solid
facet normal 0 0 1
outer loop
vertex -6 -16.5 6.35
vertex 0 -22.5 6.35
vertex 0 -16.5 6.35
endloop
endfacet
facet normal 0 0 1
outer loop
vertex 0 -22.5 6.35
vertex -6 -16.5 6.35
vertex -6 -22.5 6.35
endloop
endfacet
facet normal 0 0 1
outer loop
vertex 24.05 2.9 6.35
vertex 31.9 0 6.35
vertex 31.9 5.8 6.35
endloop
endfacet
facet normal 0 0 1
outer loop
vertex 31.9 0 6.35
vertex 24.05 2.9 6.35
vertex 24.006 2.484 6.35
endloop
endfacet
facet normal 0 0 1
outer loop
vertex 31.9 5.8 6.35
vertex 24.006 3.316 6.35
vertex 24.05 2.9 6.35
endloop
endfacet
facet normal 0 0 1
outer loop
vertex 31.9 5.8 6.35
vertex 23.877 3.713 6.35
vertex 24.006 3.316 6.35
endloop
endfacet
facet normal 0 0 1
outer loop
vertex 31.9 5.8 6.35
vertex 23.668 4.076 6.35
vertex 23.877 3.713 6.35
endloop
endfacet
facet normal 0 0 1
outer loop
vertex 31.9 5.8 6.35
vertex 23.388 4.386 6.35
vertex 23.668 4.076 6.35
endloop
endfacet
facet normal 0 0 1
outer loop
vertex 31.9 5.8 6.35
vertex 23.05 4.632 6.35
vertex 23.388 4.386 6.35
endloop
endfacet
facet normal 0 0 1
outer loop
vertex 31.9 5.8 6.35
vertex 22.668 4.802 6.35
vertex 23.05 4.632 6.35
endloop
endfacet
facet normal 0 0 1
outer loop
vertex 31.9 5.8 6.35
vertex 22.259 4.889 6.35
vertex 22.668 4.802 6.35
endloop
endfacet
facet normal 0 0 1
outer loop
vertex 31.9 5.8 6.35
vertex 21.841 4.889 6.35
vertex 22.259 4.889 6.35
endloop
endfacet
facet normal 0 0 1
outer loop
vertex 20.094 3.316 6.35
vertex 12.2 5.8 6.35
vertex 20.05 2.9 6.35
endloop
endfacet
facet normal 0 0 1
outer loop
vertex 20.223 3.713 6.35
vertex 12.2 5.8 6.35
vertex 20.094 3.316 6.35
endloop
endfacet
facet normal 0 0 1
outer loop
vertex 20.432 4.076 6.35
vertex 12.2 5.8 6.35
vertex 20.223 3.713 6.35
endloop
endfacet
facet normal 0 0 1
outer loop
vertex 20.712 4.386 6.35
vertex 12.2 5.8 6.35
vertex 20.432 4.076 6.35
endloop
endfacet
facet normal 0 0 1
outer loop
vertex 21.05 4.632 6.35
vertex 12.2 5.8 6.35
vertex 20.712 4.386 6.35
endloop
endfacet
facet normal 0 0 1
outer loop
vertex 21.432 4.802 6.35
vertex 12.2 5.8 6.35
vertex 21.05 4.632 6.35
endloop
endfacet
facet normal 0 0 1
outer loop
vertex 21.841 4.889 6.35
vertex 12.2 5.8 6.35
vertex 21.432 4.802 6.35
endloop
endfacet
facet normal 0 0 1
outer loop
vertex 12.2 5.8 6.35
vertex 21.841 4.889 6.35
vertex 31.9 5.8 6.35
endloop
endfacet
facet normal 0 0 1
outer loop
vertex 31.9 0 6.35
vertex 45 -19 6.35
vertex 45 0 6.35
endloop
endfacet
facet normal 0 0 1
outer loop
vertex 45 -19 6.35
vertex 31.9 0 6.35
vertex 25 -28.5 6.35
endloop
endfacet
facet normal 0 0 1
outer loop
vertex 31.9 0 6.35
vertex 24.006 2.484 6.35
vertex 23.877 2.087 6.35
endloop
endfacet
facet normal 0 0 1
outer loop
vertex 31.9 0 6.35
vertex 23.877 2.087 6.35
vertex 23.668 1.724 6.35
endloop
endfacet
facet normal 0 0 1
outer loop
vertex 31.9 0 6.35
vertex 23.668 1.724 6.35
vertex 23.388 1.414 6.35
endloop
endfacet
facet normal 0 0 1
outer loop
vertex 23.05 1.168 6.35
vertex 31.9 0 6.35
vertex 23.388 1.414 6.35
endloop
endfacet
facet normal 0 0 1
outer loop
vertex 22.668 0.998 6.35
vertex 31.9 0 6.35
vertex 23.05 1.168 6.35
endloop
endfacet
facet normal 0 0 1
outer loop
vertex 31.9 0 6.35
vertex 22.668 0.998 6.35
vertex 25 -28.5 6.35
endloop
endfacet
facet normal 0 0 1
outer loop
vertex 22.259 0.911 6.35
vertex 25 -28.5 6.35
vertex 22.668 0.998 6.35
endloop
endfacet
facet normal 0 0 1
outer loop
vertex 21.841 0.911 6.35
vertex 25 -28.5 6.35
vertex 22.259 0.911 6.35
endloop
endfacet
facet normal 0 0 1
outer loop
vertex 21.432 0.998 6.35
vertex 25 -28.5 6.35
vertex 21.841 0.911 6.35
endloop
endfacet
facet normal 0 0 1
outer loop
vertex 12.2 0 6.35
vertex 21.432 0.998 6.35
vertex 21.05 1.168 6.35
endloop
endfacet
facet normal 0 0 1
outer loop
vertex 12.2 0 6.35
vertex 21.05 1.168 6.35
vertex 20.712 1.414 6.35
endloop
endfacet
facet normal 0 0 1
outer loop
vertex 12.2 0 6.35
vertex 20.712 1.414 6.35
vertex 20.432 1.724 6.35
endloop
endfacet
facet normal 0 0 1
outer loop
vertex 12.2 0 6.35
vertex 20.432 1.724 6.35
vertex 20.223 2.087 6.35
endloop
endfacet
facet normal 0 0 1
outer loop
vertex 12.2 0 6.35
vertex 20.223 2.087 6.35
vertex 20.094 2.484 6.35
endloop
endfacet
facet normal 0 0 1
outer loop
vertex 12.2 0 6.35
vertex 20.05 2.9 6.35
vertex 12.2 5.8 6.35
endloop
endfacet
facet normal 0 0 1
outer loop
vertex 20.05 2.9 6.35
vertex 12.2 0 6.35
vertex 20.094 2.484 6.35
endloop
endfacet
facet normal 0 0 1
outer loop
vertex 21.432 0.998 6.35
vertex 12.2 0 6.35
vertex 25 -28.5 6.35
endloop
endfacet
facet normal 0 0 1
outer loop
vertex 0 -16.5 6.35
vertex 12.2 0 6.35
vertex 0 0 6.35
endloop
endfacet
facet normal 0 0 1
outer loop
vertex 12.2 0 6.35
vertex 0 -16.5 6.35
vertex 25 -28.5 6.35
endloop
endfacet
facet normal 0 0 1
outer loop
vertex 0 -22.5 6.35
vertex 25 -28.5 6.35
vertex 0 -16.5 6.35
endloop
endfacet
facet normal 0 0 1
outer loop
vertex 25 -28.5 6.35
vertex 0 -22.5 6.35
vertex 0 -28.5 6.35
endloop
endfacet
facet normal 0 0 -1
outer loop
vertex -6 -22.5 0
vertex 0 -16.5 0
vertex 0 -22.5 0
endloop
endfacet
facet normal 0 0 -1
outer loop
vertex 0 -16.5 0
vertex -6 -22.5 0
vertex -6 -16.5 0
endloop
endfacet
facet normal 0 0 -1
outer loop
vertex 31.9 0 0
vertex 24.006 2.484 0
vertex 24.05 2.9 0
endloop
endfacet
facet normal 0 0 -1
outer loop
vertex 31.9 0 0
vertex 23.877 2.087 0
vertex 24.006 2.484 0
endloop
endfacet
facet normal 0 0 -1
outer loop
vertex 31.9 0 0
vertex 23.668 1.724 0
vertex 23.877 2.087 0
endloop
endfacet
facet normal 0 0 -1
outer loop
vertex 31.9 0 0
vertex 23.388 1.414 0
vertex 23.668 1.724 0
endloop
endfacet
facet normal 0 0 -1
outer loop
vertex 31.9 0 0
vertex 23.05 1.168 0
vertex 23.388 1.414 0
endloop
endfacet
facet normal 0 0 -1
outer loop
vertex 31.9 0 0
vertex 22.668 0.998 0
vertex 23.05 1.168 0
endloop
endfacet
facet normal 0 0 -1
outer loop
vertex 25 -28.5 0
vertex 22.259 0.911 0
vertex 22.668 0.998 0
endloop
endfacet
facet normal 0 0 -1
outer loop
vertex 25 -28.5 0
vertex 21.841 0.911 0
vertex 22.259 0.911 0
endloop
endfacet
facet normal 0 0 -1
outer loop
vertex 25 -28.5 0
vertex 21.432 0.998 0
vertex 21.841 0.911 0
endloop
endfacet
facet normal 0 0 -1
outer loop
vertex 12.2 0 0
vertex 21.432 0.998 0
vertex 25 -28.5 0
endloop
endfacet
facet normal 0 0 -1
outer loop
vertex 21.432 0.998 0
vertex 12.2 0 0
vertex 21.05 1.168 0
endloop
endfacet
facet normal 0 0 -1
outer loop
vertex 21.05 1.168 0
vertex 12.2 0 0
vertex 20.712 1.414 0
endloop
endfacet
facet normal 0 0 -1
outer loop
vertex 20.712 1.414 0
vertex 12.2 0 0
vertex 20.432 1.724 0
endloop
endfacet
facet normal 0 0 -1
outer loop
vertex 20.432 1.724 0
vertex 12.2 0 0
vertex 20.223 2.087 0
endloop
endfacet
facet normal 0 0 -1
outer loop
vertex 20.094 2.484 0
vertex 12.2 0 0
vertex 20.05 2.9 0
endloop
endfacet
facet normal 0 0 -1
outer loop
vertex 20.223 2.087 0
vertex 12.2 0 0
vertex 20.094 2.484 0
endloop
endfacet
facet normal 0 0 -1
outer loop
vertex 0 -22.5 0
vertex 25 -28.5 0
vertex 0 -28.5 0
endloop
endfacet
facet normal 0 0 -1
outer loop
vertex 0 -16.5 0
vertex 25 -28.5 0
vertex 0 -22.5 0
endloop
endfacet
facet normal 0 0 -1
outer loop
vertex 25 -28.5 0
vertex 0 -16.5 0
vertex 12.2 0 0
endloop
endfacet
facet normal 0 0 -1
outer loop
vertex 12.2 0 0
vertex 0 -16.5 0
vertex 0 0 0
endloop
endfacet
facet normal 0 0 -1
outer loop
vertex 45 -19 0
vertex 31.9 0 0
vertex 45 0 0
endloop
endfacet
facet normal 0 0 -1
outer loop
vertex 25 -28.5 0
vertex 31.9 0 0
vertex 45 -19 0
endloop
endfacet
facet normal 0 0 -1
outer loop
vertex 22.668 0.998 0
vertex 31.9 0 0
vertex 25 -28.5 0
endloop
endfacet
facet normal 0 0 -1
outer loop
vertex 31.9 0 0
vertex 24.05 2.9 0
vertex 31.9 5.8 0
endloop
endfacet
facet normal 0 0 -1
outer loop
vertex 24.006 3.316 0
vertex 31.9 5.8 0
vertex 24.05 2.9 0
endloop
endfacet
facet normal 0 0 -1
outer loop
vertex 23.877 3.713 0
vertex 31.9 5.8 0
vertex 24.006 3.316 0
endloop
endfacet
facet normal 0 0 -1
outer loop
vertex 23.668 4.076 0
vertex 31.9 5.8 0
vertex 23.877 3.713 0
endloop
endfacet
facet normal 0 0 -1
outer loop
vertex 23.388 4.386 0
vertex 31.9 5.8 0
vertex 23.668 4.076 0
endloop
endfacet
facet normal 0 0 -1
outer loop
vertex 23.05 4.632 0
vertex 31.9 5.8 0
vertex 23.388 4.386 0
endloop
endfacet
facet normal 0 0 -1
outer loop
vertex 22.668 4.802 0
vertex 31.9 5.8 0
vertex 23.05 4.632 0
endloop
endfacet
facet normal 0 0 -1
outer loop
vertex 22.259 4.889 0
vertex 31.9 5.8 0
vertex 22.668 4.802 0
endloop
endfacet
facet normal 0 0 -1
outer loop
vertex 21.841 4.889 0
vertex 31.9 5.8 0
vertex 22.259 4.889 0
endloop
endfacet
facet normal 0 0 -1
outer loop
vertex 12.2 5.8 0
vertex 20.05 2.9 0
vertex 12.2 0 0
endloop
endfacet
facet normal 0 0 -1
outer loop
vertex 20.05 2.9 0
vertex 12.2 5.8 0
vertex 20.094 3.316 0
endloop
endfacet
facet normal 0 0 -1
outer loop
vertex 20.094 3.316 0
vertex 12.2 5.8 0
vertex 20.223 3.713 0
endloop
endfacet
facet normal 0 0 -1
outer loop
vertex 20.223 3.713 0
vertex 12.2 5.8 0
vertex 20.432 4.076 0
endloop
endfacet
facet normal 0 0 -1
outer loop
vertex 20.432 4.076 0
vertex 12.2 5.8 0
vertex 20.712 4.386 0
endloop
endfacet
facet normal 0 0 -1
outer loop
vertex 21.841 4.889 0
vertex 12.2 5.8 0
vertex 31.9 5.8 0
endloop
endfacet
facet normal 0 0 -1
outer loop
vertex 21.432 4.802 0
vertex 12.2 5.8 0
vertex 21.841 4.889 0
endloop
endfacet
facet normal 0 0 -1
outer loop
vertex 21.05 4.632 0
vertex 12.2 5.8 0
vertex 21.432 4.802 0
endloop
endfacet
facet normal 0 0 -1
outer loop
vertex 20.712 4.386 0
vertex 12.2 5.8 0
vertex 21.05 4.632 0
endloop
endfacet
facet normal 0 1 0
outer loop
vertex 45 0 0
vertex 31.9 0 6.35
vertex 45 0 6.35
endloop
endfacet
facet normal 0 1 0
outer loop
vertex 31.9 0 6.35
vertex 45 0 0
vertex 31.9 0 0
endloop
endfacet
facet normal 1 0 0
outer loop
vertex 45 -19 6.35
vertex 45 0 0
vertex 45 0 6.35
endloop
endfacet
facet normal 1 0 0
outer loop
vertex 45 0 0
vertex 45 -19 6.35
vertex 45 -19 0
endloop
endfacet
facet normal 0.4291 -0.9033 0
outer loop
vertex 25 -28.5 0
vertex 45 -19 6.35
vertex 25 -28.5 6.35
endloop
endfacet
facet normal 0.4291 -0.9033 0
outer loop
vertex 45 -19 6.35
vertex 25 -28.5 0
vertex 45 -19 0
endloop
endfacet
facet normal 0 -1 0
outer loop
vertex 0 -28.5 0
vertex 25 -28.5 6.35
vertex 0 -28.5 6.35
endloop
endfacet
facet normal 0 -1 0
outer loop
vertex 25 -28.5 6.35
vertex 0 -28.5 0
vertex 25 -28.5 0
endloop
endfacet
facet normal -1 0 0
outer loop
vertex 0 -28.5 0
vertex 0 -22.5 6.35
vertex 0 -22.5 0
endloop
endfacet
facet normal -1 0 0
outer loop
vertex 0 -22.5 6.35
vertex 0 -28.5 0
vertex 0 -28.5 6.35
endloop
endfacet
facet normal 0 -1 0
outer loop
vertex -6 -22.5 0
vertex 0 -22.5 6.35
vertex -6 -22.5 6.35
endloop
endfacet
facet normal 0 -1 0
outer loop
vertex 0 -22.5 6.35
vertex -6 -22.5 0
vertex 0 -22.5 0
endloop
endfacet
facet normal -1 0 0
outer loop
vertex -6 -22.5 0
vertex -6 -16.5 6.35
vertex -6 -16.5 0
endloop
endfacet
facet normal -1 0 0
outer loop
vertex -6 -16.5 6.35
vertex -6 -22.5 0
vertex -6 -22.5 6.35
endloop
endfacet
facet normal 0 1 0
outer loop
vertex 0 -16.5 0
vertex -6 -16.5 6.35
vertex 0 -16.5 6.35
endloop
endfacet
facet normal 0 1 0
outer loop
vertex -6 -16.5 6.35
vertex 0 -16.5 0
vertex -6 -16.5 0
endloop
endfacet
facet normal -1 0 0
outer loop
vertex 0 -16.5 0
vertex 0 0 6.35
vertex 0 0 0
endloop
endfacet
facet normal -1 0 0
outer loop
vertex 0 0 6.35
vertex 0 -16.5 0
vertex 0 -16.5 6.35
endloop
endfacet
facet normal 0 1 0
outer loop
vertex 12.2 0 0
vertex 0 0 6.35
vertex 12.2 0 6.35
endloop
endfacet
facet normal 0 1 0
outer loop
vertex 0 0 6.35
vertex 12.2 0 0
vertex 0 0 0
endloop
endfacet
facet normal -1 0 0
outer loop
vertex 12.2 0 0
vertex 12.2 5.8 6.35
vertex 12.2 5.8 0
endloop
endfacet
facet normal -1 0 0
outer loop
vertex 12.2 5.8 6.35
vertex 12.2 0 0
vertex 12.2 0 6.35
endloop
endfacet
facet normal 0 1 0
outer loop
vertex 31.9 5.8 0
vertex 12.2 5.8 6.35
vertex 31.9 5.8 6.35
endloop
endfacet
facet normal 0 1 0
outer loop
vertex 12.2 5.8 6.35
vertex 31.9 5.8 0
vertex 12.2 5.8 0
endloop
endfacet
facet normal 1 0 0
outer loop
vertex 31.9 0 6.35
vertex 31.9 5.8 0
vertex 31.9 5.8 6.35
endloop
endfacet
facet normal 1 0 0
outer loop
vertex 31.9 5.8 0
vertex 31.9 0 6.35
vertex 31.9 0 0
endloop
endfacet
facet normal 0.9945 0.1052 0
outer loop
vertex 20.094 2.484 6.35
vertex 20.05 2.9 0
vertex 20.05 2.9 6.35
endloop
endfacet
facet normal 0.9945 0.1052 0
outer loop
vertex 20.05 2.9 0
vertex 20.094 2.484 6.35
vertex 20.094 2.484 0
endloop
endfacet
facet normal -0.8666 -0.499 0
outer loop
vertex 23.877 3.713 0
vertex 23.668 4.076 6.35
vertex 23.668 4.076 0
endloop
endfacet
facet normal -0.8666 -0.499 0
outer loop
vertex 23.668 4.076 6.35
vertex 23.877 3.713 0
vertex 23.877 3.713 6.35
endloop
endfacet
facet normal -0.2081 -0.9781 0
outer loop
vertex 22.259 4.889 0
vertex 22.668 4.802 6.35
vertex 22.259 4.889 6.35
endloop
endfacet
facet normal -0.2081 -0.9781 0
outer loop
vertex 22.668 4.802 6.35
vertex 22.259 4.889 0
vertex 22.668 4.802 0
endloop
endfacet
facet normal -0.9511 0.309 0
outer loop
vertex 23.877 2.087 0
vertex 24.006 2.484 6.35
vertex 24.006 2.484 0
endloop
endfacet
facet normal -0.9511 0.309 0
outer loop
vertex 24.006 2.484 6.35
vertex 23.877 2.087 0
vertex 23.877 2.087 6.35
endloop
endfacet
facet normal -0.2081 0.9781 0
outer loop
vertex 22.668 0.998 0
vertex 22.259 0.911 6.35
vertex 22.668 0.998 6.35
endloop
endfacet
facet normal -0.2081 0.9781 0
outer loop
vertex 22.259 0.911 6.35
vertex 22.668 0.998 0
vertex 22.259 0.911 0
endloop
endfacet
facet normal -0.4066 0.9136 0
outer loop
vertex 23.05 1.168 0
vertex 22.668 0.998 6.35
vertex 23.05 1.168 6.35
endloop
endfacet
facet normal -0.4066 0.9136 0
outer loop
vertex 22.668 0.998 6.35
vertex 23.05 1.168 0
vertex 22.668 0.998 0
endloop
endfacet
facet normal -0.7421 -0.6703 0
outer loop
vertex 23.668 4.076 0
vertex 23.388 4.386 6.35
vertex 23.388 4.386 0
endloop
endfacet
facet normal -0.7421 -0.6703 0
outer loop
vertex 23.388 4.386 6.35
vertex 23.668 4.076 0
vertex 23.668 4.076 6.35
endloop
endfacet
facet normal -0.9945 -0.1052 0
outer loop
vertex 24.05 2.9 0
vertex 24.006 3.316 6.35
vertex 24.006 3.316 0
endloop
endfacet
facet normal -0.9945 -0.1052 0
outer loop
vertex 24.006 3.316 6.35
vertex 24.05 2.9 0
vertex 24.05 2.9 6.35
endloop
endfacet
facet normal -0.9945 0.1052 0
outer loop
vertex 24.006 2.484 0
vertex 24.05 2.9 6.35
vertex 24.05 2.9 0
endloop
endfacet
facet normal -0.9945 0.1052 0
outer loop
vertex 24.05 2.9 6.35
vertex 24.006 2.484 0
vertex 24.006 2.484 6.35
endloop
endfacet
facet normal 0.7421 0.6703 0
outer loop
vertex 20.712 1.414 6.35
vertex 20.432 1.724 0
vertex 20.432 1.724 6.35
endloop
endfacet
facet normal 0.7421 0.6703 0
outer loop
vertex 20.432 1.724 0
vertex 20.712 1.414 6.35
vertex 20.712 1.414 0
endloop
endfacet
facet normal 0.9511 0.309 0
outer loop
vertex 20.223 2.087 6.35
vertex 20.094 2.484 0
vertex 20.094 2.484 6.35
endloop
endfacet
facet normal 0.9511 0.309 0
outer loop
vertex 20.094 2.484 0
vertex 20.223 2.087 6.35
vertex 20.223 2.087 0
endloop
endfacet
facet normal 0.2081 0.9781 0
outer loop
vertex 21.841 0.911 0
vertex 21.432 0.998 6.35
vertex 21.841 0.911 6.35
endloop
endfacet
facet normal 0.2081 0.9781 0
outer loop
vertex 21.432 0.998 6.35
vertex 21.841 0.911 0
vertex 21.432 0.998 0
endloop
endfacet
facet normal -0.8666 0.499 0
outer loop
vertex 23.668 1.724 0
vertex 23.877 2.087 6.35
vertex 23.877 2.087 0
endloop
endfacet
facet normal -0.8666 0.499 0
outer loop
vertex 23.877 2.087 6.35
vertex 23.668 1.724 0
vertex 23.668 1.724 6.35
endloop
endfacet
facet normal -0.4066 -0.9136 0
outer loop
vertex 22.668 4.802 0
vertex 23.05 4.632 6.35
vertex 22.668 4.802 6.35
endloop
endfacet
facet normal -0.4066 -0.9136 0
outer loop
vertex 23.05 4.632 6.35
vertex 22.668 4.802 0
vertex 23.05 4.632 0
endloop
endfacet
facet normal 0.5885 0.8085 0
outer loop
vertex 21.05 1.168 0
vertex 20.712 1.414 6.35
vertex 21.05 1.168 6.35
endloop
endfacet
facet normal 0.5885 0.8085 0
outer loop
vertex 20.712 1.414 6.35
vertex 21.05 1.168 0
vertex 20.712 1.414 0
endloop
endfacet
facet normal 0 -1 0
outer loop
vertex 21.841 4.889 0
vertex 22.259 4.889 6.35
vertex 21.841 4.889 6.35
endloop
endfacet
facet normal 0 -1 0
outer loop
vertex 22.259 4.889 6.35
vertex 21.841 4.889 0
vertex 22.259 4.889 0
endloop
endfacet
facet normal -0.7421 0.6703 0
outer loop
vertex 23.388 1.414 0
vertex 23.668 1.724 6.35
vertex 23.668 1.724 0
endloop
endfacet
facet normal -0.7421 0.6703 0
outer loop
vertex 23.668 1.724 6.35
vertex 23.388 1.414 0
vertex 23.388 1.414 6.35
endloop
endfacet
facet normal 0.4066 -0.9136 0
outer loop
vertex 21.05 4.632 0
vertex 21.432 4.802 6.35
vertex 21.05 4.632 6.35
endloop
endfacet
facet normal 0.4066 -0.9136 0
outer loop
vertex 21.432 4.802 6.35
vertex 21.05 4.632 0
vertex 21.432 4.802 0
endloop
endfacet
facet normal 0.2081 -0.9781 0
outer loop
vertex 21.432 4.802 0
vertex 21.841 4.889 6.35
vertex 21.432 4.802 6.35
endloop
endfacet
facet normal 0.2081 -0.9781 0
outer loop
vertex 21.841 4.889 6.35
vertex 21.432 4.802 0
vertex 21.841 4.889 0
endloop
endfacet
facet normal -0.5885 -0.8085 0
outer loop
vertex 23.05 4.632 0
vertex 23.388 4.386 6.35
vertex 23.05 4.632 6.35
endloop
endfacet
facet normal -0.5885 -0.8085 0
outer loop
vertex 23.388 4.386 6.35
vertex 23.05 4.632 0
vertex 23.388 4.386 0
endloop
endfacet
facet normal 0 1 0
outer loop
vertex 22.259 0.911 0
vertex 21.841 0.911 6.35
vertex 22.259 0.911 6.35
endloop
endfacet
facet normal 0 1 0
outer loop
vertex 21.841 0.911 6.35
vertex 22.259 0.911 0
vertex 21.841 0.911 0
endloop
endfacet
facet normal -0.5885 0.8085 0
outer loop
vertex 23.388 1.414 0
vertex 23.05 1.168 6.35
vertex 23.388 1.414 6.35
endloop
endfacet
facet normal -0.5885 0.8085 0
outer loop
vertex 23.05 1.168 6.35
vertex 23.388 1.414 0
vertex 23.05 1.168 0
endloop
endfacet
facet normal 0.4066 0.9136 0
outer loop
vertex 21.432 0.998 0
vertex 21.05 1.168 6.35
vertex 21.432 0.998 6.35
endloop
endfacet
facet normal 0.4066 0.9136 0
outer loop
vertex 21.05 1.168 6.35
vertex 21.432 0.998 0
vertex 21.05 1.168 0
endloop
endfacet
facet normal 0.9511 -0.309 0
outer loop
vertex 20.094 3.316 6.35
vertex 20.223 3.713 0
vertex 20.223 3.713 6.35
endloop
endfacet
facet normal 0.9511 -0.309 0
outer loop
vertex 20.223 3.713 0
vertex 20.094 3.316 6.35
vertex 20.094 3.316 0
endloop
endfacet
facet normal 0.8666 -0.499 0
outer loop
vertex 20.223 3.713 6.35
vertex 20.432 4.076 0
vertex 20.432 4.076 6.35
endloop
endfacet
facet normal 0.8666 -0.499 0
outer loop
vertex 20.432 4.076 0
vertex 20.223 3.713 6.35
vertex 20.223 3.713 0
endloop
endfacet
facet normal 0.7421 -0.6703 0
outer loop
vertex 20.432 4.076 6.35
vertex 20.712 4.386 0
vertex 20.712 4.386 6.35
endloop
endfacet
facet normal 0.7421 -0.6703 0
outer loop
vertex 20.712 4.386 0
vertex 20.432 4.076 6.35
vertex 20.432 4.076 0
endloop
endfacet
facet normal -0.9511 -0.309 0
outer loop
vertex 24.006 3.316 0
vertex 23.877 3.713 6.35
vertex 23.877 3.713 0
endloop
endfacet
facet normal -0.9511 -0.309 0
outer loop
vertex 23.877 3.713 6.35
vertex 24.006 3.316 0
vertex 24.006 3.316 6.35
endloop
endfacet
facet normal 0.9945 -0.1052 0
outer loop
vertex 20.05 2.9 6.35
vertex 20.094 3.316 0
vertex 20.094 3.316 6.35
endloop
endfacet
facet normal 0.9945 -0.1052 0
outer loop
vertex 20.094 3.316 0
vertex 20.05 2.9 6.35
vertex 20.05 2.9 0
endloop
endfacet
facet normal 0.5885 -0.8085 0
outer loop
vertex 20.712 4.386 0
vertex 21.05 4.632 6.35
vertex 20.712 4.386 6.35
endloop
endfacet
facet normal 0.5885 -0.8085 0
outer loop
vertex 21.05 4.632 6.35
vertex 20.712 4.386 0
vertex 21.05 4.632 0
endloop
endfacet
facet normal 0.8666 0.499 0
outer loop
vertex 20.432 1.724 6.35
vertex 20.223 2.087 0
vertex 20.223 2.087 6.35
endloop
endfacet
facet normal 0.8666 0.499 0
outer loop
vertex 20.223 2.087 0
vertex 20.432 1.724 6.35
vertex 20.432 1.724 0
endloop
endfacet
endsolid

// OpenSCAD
	// Jitter. This should be much less than one layer height.
j=0.03;

function PanelThickness()=6.35;

// Side panel with the various holes cut out
module XSidePlate(endstop_hole=false)
{
	translate([0, 0, PanelThickness()])
	rotate([180, 0, 0])
	difference()
	{
		linear_extrude(height=PanelThickness()) 
		polygon(points=[
			[0, 0],       // 0
			[12.2, 0],    // 1
			[12.2, -5.8], // 2
			[31.9, -5.8], // 3
			[31.9, 0],    // 4
			[45, 0],      // 5
			[45, 19],     // 6
			[25, 28.5],   // 7
			[0, 28.5],    // 8
			[0, 22.5],    // 9
			[-6, 22.5],   //10
			[-6, 16.5],   //11
			[0, 16.5]     //12
		]);

		// X Endstop bolt hole
		if(endstop_hole) {
			translate([17.9, 13.3, -j])
			cylinder(h=PanelThickness()+j+j, r=1.5,$fn=30);
		}

		// Main mounting bolt hole
		translate([22.05, -2.9, -j]) 
		cylinder(h=PanelThickness()+j+j, r=2, $fn=30);
	}
}


XSidePlate();
